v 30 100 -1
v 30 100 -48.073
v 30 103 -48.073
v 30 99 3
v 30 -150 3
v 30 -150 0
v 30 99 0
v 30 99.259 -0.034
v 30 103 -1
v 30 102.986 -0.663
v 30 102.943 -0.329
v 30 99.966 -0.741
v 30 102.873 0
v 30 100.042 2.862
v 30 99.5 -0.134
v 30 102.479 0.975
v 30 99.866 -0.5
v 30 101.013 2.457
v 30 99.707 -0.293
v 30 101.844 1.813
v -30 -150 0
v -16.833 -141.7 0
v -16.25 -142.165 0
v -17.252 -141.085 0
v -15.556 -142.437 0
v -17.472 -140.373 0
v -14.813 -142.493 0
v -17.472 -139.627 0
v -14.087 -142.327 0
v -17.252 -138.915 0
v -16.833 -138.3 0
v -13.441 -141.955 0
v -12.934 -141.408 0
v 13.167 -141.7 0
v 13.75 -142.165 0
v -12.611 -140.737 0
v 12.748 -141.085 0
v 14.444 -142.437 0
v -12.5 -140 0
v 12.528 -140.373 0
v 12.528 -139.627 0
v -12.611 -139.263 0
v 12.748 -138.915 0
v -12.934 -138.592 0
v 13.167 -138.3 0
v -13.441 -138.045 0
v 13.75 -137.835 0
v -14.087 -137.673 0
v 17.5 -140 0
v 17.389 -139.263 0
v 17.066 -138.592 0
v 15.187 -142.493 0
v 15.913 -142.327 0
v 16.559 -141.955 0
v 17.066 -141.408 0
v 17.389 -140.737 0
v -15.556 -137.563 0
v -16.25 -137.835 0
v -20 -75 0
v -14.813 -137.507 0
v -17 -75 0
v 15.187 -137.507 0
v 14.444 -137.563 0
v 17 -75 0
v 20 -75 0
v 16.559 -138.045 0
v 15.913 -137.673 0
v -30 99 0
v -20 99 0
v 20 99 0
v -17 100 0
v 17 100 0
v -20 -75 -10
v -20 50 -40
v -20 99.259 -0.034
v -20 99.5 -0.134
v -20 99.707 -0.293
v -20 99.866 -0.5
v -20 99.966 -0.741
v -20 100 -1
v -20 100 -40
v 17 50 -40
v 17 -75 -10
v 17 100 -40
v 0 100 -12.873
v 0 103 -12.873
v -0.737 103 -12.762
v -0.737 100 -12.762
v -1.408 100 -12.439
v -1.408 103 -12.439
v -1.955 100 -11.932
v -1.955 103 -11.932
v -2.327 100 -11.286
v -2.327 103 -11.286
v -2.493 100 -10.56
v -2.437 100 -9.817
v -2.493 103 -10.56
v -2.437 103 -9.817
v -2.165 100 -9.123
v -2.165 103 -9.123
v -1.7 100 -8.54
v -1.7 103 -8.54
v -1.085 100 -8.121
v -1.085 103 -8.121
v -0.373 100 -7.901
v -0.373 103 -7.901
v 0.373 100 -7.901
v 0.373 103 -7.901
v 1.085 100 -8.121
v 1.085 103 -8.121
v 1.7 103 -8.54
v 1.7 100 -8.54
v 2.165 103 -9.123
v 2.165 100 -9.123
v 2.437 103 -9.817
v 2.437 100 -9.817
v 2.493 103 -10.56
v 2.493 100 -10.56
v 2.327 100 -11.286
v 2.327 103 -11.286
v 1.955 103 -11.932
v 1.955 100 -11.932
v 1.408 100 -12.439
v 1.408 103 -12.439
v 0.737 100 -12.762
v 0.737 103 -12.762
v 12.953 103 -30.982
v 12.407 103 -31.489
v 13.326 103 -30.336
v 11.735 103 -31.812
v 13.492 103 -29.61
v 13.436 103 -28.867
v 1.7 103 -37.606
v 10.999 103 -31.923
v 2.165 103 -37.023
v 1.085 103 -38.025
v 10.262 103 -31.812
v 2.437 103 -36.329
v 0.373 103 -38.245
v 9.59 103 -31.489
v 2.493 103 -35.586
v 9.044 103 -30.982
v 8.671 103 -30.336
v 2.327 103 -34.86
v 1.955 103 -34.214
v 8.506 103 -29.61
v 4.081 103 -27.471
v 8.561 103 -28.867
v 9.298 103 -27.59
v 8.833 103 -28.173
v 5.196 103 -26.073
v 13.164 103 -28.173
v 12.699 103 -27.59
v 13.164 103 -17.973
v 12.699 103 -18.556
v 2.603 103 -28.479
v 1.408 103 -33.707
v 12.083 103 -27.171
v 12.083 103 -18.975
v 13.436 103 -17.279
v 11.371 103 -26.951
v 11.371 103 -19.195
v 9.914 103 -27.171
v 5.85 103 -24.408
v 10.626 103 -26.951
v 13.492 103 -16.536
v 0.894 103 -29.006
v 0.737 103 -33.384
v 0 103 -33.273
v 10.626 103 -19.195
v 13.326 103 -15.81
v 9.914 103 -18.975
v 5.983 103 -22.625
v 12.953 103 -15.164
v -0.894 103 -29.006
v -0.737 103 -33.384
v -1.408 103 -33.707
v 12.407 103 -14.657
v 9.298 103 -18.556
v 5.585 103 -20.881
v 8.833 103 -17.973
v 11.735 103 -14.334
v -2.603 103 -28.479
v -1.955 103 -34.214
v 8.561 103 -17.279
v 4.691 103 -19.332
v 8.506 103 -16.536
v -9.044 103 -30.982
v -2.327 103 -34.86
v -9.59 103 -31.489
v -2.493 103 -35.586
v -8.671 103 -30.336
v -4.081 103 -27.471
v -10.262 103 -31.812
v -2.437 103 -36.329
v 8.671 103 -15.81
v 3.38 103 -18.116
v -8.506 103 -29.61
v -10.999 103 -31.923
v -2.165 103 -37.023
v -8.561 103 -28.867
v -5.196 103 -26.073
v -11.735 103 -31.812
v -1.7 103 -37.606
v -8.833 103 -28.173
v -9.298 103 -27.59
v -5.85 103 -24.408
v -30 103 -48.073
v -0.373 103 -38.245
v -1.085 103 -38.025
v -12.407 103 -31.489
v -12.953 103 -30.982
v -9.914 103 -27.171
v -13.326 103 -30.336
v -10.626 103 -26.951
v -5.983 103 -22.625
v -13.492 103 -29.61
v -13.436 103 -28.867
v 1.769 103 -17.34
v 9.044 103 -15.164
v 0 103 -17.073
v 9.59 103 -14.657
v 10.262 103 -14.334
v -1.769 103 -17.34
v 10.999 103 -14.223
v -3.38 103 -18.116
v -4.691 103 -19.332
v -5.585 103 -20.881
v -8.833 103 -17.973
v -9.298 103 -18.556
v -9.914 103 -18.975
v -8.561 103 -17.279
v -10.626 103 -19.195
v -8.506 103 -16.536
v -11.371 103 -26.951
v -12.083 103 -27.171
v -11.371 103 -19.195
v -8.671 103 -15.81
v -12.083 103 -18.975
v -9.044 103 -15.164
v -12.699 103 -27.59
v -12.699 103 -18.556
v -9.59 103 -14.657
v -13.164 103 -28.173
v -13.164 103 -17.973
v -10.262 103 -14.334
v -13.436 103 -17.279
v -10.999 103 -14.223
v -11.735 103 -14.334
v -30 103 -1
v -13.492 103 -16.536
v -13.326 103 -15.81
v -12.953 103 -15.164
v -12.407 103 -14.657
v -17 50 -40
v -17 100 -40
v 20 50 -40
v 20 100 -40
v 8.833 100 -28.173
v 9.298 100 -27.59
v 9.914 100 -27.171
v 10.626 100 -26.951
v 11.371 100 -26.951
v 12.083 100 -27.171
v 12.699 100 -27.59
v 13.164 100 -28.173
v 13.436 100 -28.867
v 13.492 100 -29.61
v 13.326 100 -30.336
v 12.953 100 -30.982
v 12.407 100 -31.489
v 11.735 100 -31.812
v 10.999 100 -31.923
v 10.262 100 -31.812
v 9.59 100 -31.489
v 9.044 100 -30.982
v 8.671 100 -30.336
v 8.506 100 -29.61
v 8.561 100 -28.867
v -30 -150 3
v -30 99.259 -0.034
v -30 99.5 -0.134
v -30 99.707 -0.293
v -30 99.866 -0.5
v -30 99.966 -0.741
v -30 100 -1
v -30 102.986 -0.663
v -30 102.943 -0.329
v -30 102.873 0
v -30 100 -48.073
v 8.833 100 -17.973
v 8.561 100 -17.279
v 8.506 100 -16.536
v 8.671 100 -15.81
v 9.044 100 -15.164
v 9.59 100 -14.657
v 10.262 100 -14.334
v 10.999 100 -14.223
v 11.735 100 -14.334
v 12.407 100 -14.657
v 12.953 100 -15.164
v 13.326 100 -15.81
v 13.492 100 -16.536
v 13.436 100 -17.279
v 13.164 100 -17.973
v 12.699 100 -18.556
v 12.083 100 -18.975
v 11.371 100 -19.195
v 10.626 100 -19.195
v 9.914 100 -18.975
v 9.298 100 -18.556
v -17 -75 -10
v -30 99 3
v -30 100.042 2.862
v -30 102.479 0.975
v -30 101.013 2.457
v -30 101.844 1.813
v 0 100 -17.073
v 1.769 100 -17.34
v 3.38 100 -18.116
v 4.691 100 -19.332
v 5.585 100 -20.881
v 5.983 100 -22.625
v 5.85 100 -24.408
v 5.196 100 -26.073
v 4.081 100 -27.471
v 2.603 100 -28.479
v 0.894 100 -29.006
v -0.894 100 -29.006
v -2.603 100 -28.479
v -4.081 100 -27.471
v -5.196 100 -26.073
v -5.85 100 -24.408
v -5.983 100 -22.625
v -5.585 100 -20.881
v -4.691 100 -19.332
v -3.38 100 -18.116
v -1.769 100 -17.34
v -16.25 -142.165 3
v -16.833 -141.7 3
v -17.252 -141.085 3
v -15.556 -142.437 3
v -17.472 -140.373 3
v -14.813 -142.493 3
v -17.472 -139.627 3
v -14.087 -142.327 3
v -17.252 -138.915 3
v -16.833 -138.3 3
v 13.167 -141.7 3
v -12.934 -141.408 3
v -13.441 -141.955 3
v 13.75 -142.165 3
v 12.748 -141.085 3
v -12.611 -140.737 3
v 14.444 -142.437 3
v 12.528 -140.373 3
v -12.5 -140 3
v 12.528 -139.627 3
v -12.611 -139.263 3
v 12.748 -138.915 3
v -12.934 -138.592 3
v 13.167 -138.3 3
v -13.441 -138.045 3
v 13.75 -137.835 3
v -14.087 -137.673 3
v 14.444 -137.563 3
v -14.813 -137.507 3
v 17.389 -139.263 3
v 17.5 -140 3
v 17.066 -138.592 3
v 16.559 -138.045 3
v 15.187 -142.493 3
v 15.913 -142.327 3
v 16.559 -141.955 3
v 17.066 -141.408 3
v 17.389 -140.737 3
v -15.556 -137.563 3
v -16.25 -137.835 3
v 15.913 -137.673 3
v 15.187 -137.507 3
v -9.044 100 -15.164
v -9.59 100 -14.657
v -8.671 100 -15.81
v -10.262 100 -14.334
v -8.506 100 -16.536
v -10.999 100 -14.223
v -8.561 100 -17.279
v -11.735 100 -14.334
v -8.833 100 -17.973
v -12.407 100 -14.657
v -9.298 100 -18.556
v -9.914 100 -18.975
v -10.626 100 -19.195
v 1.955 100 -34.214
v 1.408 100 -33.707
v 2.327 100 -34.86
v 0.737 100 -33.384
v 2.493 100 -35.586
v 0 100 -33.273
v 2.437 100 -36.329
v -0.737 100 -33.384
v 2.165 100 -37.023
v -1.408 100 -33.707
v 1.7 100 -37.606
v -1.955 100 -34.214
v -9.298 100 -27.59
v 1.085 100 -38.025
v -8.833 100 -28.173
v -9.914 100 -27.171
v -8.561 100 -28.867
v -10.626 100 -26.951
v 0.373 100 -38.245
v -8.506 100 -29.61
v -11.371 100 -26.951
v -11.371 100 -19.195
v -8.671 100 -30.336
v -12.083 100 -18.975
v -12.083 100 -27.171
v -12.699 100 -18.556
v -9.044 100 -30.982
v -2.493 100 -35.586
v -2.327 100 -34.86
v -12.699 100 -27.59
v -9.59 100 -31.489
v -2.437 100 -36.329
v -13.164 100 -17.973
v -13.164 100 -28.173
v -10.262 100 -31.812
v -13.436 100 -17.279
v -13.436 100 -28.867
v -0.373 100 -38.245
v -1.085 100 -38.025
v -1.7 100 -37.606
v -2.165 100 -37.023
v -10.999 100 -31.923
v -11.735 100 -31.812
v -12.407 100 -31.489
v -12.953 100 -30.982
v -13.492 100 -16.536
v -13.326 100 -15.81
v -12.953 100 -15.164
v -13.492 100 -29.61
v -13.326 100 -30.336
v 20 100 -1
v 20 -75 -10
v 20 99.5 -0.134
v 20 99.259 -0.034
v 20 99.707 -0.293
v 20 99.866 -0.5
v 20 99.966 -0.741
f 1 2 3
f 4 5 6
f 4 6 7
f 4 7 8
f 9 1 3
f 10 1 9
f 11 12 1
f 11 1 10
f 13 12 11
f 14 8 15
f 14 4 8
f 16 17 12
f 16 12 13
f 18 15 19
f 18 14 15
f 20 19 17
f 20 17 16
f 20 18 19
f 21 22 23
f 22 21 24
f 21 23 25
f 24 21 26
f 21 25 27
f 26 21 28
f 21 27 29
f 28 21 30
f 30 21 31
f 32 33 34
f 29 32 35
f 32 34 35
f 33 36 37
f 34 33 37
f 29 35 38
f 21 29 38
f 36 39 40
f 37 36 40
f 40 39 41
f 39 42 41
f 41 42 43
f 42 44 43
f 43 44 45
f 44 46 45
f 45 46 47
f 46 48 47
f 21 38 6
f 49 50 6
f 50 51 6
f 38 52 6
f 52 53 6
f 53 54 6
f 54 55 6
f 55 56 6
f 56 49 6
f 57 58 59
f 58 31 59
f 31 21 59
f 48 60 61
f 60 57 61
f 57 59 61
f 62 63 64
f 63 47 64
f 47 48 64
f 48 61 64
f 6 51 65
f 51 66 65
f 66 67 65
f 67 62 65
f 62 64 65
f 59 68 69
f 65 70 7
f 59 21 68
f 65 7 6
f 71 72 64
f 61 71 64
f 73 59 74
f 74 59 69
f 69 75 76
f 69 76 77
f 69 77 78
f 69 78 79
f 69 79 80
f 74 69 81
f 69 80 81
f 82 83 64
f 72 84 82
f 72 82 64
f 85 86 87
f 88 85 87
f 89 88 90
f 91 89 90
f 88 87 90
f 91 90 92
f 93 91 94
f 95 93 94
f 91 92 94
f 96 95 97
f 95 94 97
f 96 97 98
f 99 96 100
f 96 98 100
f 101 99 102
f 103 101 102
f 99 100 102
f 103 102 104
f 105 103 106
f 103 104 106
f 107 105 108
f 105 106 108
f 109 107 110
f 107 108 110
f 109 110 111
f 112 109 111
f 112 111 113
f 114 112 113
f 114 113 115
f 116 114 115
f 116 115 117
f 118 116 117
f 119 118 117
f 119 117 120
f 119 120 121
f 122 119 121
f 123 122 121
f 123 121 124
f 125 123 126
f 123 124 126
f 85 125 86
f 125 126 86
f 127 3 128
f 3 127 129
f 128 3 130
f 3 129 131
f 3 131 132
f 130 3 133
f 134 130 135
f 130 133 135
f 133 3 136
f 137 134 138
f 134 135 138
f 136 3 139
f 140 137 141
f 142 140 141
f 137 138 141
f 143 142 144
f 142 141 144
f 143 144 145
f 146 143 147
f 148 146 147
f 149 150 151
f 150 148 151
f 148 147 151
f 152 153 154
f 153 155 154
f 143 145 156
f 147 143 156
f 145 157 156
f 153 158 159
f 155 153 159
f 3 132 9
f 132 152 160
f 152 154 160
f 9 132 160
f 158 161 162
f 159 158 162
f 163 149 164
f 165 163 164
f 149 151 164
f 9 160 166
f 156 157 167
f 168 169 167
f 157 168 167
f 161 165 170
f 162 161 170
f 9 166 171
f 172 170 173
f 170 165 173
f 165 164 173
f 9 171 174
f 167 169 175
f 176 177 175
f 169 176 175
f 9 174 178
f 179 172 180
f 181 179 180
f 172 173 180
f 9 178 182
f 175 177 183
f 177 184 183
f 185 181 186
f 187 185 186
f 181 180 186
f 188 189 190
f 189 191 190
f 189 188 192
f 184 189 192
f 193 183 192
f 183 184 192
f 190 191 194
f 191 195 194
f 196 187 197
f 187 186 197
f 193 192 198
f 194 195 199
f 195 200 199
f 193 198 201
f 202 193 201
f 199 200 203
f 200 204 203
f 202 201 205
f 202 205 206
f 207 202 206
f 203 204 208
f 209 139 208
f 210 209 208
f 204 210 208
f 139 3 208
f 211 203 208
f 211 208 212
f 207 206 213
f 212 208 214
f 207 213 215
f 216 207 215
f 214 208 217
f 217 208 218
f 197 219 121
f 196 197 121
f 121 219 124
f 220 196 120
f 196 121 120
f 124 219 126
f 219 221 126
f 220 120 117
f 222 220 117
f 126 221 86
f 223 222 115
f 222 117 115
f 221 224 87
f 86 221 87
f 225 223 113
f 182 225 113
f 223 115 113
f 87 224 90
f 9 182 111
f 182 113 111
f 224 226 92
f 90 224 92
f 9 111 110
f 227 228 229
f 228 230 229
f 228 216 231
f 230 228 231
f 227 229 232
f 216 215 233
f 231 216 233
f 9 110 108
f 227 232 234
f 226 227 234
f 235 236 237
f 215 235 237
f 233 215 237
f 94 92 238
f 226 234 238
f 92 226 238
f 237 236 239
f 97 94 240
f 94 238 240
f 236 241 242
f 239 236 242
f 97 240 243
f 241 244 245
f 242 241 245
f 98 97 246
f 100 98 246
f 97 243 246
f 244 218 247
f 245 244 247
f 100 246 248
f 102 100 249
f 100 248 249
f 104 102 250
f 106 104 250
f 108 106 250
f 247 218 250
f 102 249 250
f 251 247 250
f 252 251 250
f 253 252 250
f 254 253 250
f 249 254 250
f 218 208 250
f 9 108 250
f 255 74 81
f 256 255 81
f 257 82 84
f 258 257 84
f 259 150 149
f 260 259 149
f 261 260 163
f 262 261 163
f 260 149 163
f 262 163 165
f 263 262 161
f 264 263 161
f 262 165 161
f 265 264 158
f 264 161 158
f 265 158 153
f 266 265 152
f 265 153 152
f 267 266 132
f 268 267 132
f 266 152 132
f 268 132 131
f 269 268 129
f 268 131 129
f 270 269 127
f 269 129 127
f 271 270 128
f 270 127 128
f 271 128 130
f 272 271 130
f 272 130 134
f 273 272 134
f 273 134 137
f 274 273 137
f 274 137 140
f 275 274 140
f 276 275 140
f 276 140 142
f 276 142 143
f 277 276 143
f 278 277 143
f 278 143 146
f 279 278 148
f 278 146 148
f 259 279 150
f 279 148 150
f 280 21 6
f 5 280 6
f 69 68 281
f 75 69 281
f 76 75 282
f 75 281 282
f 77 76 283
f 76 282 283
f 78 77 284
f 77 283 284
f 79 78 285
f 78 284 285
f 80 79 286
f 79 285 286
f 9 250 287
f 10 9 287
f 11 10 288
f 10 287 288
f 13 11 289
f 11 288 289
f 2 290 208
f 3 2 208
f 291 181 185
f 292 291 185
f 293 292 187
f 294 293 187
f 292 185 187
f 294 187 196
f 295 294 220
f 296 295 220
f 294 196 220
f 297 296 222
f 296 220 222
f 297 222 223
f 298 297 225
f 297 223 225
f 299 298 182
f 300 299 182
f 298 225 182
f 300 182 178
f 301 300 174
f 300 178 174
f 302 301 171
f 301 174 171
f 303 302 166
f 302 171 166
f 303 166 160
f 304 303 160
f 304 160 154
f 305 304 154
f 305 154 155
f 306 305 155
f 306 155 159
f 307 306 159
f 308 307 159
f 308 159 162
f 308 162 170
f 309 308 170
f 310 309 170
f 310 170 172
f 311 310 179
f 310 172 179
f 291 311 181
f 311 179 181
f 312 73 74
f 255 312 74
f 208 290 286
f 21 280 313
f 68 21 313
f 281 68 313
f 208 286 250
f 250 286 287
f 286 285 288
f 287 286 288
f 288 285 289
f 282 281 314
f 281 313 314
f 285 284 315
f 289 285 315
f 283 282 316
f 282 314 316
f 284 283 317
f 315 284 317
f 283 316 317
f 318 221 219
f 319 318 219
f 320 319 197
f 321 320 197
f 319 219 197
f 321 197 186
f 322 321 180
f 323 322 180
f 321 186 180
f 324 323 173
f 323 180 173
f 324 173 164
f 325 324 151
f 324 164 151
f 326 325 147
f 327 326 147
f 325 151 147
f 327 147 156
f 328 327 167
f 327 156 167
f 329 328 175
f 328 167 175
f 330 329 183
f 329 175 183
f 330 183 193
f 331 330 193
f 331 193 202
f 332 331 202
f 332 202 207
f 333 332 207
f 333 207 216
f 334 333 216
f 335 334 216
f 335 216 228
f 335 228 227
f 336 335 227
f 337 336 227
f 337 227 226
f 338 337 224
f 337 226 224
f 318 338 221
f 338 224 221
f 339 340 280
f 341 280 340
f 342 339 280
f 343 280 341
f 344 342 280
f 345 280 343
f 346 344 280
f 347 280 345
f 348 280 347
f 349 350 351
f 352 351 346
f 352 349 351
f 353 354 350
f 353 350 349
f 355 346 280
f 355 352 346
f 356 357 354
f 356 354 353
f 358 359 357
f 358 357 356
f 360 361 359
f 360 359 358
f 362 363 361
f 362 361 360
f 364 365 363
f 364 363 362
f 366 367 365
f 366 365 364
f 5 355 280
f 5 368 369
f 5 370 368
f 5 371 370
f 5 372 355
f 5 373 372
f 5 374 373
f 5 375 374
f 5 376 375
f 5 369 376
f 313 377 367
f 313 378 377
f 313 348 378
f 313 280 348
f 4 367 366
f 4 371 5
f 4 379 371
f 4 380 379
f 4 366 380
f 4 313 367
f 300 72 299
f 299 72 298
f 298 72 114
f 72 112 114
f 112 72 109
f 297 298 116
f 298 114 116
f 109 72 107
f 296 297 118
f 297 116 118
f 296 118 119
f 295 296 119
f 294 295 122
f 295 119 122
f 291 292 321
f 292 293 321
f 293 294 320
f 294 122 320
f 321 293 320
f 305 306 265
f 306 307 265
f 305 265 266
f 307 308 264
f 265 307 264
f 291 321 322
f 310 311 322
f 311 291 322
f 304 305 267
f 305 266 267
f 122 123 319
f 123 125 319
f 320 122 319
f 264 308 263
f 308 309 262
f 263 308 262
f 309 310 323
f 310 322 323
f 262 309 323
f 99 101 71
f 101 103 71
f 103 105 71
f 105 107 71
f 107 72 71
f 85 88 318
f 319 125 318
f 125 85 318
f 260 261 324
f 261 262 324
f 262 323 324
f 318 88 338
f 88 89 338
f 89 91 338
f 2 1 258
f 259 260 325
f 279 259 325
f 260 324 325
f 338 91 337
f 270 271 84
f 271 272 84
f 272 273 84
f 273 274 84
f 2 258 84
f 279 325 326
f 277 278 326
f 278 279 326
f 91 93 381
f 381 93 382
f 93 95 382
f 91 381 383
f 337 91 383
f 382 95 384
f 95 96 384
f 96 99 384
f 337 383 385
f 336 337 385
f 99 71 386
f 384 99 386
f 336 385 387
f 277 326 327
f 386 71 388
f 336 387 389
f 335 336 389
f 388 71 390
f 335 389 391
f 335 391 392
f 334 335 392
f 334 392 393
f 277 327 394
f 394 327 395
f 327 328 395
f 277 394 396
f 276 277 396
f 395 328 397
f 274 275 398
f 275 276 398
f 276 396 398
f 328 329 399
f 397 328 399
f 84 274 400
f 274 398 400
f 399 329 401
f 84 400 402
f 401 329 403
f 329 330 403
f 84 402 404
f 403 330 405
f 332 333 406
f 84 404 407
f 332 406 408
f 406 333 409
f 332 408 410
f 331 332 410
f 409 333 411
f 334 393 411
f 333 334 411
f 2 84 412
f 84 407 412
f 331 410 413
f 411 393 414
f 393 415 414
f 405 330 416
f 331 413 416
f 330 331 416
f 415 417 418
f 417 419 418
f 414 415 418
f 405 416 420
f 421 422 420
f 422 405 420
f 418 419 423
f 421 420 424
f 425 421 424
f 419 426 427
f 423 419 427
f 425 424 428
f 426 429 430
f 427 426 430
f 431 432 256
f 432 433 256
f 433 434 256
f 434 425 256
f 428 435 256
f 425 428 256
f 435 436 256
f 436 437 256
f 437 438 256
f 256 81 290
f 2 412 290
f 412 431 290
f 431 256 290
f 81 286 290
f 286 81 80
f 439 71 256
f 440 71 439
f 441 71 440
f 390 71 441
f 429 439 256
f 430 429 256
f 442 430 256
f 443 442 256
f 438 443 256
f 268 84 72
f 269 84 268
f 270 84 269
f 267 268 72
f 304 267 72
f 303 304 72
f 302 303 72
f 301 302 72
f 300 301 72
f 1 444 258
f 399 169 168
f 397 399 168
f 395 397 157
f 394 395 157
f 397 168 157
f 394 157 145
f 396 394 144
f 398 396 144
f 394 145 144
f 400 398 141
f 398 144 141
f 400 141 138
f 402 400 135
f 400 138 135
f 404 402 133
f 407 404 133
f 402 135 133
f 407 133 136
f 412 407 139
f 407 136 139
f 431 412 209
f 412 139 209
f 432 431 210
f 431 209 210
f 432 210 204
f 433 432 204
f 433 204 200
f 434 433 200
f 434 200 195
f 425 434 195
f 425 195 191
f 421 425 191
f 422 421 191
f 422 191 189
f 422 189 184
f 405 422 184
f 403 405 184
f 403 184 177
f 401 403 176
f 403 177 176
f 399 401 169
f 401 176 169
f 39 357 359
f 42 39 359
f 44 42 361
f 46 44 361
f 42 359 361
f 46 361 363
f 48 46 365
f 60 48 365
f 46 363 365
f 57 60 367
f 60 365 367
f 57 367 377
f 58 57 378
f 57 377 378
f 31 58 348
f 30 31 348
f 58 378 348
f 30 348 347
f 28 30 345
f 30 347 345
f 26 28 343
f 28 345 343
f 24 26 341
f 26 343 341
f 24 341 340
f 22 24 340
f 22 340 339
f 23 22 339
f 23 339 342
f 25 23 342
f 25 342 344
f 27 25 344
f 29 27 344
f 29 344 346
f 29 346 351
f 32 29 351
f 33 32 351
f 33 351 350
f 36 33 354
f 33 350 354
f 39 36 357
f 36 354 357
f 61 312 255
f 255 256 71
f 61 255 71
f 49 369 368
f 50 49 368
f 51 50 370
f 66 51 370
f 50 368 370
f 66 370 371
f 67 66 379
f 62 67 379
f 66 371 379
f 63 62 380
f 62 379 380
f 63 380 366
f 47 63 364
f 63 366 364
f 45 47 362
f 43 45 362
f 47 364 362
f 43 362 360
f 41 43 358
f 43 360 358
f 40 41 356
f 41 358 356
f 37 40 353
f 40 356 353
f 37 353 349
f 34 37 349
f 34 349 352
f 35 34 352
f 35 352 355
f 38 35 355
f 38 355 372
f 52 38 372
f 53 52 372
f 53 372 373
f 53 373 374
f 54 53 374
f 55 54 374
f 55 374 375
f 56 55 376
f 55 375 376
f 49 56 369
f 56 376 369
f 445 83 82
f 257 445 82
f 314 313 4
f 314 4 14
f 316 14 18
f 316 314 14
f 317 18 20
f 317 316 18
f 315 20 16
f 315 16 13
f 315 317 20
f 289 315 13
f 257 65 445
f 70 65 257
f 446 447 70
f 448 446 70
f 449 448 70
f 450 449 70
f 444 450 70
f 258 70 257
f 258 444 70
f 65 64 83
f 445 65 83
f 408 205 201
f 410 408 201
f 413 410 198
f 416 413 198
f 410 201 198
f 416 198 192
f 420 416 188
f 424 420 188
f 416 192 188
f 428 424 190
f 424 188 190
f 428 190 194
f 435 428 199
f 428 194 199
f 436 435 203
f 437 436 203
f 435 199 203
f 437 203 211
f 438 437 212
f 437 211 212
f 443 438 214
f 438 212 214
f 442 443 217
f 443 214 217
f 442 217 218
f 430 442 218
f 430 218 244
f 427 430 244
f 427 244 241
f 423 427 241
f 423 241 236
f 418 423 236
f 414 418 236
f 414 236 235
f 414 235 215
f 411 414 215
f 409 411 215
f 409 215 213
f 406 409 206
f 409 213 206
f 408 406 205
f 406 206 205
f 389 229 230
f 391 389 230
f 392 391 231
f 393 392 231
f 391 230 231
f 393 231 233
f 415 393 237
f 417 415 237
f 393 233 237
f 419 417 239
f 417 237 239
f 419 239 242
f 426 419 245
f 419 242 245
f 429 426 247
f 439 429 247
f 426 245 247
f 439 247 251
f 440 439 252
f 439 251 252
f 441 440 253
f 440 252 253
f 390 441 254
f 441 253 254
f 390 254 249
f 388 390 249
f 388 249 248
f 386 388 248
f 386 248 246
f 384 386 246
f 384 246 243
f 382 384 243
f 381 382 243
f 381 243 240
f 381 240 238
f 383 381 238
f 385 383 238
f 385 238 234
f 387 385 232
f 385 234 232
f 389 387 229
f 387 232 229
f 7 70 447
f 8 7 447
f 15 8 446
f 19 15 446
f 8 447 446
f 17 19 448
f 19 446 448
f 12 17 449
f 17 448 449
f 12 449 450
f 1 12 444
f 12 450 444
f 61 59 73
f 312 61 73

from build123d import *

# Parameters (mm, degrees)
ESBO_O1_W                = 60
ESBO_O1_H                = 300
RESSALTO_EXTRUS_O1_DEPTH = 3
DOBRA_START              = -30
DOBRA_ESBO_ADA1_DEPTH    = 60
DOBRA_ESBO_ADA1_2_DEPTH  = 60
NERVURA1_START           = -20
NERVURA1_DEPTH           = 40
CORTE_EXTRUS_O1_START    = -175
ESBO_O6_W                = 34
ESBO_O6_H                = 40
CORTE_EXTRUS_O1_DEPTH    = 175
ESBO_O7_R                = 2.5
CORTE_EXTRUS_O2_DEPTH    = 3
ESBO_O8_R                = 6
CORTE_EXTRUS_O3_DEPTH    = 3
ESBO_O9_R                = 2.5
CORTE_EXTRUS_O4_DEPTH    = 3
PADR_OCIRCULAR1_COUNT    = 6


# Read off the part's stored shape, not the designer's step: Dobra esboçada1, Nervura1
with BuildPart() as part:
    # Esboço1 → Ressalto-extrusão1 (new body)
    with BuildSketch(Plane.XY):
        Rectangle(ESBO_O1_W, ESBO_O1_H)
    extrude(amount=RESSALTO_EXTRUS_O1_DEPTH)

    # Dobra esboçada1 outline → Dobra esboçada1 (cut)
    with BuildSketch(Plane.YZ.offset(DOBRA_START)):
        with BuildLine():
            ThreePointArc((99, 3), (101.449489743, 2.16227766), (102.872983346, 0))
            Line((102.872983346, 0), (150, 0))
            Line((150, 0), (150, 3))
            Line((150, 3), (99, 3))
        make_face()
    extrude(amount=DOBRA_ESBO_ADA1_DEPTH, mode=Mode.SUBTRACT)

    # Dobra esbo_ada1 2 outline → Dobra esbo_ada1 2 (add)
    with BuildSketch(Plane.YZ.offset(DOBRA_START)):
        with BuildLine():
            Line((100, -1), (100, -48.073009183))
            Line((100, -48.073009183), (103, -48.073009183))
            Line((103, -48.073009183), (103, -1))
            ThreePointArc((103, -1), (102.968118785, -0.49598283), (102.872983346, 0))
            Line((102.872983346, 0), (99, 0))
            ThreePointArc((99, 0), (99.707106781, -0.292893219), (100, -1))
        make_face()
    extrude(amount=DOBRA_ESBO_ADA1_2_DEPTH)

    # Nervura1 outline → Nervura1 (add)
    with BuildSketch(Plane(origin=(0, 0, 0), x_dir=(0, 0, -1), z_dir=(1, 0, 0)).offset(NERVURA1_START)):
        with BuildLine():
            Line((40, 50), (40, 100))
            Line((40, 100), (1, 100))
            ThreePointArc((1, 100), (0.292893219, 99.707106781), (0, 99))
            Line((0, 99), (0, -75))
            Line((0, -75), (10, -75))
            Line((10, -75), (40, 50))
        make_face()
    extrude(amount=NERVURA1_DEPTH)

    # Esboço6 → Corte-extrusão1 (cut)
    with BuildSketch(Plane.XZ.offset(75).offset(CORTE_EXTRUS_O1_START)):
        with Locations((0, -20)):
            Rectangle(ESBO_O6_W, ESBO_O6_H)
    extrude(amount=CORTE_EXTRUS_O1_DEPTH, mode=Mode.SUBTRACT)

    # Esboço7 → Corte-extrusão2 (cut)
    with BuildSketch(Plane.XY.offset(3)):
        with Locations((-15, -140)):
            Circle(ESBO_O7_R)
        with Locations((15, -140)):
            Circle(ESBO_O7_R)
    extrude(amount=-CORTE_EXTRUS_O2_DEPTH, mode=Mode.SUBTRACT)

    # Esboço8 → Corte-extrusão3 (cut)
    with BuildSketch(Plane(origin=(0, 103, 0), x_dir=(1, 0, 0), z_dir=(0, 1, 0))):
        with Locations(Location((0, 23.073009183, 0), (0, 0, 270))):
            Circle(ESBO_O8_R)
    extrude(amount=-CORTE_EXTRUS_O3_DEPTH, mode=Mode.SUBTRACT)

    # Esboço9 → Corte-extrusão4 (cut)
    with BuildSketch(Plane(origin=(0, 103, 0), x_dir=(1, 0, 0), z_dir=(0, 1, 0))):
        with Locations(Location((0, 35.773009183, 0), (0, 0, 270))):
            Circle(ESBO_O9_R)
    corte_extrus_o4 = extrude(amount=-CORTE_EXTRUS_O4_DEPTH, mode=Mode.SUBTRACT)

    # PadrãoCircular1: Corte-extrusão4 ×6 about axis
    padr_ocircular1_axis = Axis((0, 0, -23.073009183), (0, 1, 0))
    for i in range(1, PADR_OCIRCULAR1_COUNT):
        add(corte_extrus_o4.rotate(padr_ocircular1_axis, i * 360 / PADR_OCIRCULAR1_COUNT), mode=Mode.SUBTRACT)


solid = part.part
